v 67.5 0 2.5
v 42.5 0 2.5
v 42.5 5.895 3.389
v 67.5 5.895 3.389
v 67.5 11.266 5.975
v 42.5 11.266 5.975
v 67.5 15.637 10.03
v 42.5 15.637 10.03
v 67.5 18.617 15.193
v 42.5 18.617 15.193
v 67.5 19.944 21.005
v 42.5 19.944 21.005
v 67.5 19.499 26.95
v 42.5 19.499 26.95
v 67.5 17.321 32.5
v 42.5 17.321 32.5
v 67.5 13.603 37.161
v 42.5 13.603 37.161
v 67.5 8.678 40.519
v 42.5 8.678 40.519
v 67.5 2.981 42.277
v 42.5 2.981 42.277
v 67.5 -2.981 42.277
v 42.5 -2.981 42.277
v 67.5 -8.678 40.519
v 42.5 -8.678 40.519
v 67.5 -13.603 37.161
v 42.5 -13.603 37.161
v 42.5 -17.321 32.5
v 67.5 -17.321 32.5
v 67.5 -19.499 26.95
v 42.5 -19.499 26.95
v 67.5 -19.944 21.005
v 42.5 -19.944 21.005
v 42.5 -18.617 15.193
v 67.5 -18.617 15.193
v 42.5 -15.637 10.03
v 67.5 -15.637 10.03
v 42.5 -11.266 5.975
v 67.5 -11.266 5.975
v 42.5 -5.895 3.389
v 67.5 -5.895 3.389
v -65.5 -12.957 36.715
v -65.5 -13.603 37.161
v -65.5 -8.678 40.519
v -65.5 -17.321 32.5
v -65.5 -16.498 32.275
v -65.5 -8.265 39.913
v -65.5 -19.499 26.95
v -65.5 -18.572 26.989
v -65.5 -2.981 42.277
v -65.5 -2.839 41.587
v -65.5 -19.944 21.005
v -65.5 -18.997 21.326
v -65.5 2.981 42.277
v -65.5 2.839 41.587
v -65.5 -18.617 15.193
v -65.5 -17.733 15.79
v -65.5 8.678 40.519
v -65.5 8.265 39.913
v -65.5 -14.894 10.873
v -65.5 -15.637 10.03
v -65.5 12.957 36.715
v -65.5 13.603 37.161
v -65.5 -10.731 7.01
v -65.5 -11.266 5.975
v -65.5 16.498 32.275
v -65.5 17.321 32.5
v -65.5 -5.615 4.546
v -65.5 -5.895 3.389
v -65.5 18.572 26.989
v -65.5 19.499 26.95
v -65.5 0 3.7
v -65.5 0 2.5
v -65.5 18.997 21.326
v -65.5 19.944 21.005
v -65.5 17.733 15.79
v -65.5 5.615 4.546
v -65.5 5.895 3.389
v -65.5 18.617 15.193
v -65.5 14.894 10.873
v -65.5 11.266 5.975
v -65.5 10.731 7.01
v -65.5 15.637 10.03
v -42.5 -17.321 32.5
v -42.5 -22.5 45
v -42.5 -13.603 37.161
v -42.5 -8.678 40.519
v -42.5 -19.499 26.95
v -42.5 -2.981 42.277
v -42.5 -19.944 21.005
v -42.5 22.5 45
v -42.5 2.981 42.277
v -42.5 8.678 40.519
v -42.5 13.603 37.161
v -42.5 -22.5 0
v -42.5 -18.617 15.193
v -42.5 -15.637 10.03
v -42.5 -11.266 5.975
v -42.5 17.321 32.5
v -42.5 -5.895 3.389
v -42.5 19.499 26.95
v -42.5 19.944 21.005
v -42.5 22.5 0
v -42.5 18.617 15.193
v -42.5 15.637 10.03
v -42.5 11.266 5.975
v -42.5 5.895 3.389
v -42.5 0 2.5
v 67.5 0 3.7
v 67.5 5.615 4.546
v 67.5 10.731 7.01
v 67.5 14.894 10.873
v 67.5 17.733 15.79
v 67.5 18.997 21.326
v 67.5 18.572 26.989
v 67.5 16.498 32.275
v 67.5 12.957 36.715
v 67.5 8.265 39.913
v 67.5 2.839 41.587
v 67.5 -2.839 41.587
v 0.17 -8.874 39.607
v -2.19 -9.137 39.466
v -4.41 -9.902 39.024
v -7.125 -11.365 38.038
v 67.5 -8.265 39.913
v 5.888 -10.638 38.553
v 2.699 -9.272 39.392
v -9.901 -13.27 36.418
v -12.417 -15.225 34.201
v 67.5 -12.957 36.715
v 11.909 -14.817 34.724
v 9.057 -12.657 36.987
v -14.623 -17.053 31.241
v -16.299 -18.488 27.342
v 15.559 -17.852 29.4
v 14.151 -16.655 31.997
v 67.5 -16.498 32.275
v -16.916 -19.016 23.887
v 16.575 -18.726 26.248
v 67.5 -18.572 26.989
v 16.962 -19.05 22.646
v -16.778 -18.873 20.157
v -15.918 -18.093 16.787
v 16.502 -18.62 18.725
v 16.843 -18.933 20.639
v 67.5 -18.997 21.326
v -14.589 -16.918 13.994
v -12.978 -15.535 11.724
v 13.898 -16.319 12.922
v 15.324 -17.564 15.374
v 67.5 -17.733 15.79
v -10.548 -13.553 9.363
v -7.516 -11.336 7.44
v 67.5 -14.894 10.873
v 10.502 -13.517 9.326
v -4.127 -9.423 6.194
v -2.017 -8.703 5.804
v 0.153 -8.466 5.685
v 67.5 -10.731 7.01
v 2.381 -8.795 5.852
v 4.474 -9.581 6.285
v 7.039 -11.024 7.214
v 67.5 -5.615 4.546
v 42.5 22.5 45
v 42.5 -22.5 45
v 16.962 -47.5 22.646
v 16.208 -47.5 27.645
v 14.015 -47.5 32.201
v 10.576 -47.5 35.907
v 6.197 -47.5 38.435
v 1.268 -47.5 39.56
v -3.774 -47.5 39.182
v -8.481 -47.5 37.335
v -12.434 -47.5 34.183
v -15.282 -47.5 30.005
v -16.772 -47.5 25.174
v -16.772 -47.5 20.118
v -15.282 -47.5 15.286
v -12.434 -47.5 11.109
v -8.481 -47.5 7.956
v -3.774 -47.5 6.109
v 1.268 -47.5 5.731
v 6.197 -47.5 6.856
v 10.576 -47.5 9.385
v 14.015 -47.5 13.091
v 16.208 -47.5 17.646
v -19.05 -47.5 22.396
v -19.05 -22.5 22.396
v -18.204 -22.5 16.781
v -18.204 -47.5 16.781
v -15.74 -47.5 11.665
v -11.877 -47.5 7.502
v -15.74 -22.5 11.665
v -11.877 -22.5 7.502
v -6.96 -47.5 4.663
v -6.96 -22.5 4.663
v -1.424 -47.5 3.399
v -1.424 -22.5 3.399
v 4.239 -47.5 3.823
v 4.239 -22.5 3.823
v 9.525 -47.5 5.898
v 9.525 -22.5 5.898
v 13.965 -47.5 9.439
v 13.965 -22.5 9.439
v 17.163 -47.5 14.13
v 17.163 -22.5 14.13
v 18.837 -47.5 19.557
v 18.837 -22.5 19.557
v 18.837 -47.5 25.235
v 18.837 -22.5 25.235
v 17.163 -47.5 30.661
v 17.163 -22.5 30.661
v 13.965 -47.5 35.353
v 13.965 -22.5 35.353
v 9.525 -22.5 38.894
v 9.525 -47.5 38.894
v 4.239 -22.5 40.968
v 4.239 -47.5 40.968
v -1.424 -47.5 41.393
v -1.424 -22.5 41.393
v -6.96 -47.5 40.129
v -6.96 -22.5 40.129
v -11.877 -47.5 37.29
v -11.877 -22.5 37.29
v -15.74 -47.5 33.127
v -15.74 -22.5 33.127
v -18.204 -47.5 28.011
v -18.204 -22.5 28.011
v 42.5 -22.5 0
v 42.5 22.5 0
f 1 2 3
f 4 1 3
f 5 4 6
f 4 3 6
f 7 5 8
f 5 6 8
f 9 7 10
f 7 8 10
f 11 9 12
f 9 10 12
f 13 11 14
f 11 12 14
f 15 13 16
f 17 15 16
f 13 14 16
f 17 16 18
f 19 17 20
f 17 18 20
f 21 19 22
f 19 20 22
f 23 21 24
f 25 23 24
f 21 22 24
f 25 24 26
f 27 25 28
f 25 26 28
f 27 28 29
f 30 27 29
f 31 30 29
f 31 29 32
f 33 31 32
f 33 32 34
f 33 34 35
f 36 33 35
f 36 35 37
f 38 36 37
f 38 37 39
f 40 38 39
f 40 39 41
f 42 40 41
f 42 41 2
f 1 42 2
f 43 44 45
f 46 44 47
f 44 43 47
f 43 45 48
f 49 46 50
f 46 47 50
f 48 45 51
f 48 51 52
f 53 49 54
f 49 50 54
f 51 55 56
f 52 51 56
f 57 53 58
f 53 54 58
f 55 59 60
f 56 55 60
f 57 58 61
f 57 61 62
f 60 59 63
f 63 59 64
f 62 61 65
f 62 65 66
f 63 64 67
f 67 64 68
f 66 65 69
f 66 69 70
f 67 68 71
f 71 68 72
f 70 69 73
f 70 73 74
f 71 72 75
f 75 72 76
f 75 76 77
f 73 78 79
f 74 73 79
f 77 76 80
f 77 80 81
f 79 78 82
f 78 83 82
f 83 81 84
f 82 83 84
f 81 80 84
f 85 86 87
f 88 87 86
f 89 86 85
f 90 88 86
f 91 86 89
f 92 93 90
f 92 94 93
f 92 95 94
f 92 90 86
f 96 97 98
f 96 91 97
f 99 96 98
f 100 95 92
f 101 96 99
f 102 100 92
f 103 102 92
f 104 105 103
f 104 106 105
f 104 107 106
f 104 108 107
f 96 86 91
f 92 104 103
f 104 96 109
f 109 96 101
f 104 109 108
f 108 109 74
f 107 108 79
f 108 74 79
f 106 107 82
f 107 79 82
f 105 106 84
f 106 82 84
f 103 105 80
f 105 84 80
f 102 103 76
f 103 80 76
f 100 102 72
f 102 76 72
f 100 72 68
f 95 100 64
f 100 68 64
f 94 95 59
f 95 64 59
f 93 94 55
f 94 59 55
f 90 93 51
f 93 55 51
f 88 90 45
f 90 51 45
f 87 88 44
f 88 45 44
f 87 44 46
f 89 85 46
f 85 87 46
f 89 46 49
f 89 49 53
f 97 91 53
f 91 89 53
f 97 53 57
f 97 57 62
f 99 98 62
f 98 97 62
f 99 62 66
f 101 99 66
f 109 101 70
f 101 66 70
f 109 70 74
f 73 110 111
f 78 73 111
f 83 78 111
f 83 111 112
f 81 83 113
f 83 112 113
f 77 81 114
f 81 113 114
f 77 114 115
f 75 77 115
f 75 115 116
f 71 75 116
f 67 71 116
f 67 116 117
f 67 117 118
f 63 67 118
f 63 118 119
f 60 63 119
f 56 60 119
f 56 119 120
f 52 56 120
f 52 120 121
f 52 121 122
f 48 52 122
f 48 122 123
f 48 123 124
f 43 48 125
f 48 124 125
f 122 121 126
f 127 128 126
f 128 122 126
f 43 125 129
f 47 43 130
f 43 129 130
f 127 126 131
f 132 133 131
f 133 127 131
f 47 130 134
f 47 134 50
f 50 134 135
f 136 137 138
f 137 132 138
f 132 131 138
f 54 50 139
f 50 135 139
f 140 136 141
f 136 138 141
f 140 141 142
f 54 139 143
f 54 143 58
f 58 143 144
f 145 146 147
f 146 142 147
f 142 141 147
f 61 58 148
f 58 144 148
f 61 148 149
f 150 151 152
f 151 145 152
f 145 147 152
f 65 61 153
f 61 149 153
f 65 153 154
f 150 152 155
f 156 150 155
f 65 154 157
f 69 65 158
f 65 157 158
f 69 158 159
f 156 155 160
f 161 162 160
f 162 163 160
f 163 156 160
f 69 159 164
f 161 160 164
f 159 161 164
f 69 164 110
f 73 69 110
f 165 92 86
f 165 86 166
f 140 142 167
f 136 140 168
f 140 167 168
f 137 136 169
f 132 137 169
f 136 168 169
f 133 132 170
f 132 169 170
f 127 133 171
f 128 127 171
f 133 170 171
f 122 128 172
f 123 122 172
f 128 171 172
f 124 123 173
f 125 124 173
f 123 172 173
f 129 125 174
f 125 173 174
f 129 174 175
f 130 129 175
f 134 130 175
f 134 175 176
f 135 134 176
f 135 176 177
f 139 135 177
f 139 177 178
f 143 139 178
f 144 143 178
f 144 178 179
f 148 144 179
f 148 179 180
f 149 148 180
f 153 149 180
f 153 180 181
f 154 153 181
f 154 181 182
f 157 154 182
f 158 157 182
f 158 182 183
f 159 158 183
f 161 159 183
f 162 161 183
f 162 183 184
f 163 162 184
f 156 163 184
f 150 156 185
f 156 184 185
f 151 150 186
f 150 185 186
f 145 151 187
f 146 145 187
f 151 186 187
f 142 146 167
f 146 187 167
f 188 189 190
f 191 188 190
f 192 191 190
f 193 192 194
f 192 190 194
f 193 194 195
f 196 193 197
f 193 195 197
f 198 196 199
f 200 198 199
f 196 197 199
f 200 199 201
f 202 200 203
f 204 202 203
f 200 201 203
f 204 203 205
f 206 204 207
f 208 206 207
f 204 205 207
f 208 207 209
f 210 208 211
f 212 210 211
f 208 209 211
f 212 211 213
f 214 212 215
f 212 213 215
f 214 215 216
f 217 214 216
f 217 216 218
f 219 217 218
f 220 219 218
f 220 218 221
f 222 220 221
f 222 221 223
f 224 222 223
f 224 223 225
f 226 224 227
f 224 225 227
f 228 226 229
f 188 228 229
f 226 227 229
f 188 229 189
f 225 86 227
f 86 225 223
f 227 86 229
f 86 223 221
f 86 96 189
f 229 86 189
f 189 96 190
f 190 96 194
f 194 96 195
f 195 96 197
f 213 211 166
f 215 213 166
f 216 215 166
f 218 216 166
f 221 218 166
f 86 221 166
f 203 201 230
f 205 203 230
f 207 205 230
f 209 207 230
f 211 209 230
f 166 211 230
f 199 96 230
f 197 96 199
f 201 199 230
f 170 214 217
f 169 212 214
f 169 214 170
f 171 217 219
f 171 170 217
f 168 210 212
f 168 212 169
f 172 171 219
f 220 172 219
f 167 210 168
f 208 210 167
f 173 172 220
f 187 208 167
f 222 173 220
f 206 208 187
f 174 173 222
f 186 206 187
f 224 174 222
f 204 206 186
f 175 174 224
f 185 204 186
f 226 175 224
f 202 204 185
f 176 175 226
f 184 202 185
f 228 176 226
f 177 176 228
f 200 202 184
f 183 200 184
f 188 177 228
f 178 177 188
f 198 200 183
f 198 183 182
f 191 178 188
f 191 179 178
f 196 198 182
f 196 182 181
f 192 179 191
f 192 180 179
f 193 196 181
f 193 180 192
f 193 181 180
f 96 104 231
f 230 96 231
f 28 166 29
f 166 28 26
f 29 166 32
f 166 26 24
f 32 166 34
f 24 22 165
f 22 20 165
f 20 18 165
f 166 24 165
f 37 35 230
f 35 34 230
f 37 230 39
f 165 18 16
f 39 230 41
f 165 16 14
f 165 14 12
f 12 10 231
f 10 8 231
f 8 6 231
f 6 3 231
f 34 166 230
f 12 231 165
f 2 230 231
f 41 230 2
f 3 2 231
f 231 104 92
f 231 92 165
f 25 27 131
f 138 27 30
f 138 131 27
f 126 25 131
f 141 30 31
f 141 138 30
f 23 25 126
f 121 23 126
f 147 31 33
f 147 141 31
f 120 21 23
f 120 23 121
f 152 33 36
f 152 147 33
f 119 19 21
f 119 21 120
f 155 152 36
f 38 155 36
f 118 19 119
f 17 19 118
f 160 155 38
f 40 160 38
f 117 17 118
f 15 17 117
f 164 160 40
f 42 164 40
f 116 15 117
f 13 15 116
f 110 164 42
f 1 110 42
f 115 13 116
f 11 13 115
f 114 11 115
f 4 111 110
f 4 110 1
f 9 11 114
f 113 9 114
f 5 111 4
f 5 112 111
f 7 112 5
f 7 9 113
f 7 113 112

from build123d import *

# Parameters (mm, degrees)
CROQUIS1_W                   = 85
CROQUIS1_H                   = 45
SALIENTE_EXTRUIR1_DEPTH      = 45
SALIENTE_EXTRUIR2_DEPTH      = 25
SALIENTE_EXTRUIR2_DEPTH_BACK = 108
CROQUIS2_R                   = 20
CROQUIS7_R                   = 19.05
SALIENTE_EXTRUIR3_DEPTH      = 25
CROQUIS10_R                  = 16.961855078
CORTAR_EXTRUIR2_DEPTH        = 45
CROQUIS12_R                  = 19.05
CORTAR_EXTRUIR3_DEPTH        = 159


with BuildPart() as part:
    # Croquis1 → Saliente-Extruir1 (new body)
    with BuildSketch(Plane.XY):
        Rectangle(CROQUIS1_W, CROQUIS1_H)
    extrude(amount=SALIENTE_EXTRUIR1_DEPTH)

    # Croquis2 → Saliente-Extruir2 (add, two sides: drawn at the far end of the back side and taken through both)
    with BuildSketch(Plane(origin=(42.5, 0, 0), x_dir=(0, 0, -1), z_dir=(1, 0, 0)).offset(-SALIENTE_EXTRUIR2_DEPTH_BACK)):
        with Locations((-22.5, 0)):
            Circle(CROQUIS2_R)
    extrude(amount=SALIENTE_EXTRUIR2_DEPTH + SALIENTE_EXTRUIR2_DEPTH_BACK)

    # Croquis7 → Saliente-Extruir3 (add)
    with BuildSketch(Plane.XZ.offset(22.5)):
        with Locations(Location((0, 22.39581729, 0), (0, 0, 180))):
            Circle(CROQUIS7_R)
    extrude(amount=SALIENTE_EXTRUIR3_DEPTH)

    # Croquis10 → Cortar-Extruir2 (cut)
    with BuildSketch(Plane(origin=(0, -47.5, 0), x_dir=(-1, 0, 0), z_dir=(0, -1, 0))):
        with Locations(Location((0, -22.64581729, 0), (0, 0, 180))):
            Circle(CROQUIS10_R)
    extrude(amount=-CORTAR_EXTRUIR2_DEPTH, mode=Mode.SUBTRACT)

    # Croquis12 → Cortar-Extruir3 (cut)
    with BuildSketch(Plane(origin=(67.5, 0, 0), x_dir=(0, 0, -1), z_dir=(1, 0, 0))):
        with Locations((-22.75, 0)):
            Circle(CROQUIS12_R)
    extrude(amount=-CORTAR_EXTRUIR3_DEPTH, mode=Mode.SUBTRACT)


solid = part.part
